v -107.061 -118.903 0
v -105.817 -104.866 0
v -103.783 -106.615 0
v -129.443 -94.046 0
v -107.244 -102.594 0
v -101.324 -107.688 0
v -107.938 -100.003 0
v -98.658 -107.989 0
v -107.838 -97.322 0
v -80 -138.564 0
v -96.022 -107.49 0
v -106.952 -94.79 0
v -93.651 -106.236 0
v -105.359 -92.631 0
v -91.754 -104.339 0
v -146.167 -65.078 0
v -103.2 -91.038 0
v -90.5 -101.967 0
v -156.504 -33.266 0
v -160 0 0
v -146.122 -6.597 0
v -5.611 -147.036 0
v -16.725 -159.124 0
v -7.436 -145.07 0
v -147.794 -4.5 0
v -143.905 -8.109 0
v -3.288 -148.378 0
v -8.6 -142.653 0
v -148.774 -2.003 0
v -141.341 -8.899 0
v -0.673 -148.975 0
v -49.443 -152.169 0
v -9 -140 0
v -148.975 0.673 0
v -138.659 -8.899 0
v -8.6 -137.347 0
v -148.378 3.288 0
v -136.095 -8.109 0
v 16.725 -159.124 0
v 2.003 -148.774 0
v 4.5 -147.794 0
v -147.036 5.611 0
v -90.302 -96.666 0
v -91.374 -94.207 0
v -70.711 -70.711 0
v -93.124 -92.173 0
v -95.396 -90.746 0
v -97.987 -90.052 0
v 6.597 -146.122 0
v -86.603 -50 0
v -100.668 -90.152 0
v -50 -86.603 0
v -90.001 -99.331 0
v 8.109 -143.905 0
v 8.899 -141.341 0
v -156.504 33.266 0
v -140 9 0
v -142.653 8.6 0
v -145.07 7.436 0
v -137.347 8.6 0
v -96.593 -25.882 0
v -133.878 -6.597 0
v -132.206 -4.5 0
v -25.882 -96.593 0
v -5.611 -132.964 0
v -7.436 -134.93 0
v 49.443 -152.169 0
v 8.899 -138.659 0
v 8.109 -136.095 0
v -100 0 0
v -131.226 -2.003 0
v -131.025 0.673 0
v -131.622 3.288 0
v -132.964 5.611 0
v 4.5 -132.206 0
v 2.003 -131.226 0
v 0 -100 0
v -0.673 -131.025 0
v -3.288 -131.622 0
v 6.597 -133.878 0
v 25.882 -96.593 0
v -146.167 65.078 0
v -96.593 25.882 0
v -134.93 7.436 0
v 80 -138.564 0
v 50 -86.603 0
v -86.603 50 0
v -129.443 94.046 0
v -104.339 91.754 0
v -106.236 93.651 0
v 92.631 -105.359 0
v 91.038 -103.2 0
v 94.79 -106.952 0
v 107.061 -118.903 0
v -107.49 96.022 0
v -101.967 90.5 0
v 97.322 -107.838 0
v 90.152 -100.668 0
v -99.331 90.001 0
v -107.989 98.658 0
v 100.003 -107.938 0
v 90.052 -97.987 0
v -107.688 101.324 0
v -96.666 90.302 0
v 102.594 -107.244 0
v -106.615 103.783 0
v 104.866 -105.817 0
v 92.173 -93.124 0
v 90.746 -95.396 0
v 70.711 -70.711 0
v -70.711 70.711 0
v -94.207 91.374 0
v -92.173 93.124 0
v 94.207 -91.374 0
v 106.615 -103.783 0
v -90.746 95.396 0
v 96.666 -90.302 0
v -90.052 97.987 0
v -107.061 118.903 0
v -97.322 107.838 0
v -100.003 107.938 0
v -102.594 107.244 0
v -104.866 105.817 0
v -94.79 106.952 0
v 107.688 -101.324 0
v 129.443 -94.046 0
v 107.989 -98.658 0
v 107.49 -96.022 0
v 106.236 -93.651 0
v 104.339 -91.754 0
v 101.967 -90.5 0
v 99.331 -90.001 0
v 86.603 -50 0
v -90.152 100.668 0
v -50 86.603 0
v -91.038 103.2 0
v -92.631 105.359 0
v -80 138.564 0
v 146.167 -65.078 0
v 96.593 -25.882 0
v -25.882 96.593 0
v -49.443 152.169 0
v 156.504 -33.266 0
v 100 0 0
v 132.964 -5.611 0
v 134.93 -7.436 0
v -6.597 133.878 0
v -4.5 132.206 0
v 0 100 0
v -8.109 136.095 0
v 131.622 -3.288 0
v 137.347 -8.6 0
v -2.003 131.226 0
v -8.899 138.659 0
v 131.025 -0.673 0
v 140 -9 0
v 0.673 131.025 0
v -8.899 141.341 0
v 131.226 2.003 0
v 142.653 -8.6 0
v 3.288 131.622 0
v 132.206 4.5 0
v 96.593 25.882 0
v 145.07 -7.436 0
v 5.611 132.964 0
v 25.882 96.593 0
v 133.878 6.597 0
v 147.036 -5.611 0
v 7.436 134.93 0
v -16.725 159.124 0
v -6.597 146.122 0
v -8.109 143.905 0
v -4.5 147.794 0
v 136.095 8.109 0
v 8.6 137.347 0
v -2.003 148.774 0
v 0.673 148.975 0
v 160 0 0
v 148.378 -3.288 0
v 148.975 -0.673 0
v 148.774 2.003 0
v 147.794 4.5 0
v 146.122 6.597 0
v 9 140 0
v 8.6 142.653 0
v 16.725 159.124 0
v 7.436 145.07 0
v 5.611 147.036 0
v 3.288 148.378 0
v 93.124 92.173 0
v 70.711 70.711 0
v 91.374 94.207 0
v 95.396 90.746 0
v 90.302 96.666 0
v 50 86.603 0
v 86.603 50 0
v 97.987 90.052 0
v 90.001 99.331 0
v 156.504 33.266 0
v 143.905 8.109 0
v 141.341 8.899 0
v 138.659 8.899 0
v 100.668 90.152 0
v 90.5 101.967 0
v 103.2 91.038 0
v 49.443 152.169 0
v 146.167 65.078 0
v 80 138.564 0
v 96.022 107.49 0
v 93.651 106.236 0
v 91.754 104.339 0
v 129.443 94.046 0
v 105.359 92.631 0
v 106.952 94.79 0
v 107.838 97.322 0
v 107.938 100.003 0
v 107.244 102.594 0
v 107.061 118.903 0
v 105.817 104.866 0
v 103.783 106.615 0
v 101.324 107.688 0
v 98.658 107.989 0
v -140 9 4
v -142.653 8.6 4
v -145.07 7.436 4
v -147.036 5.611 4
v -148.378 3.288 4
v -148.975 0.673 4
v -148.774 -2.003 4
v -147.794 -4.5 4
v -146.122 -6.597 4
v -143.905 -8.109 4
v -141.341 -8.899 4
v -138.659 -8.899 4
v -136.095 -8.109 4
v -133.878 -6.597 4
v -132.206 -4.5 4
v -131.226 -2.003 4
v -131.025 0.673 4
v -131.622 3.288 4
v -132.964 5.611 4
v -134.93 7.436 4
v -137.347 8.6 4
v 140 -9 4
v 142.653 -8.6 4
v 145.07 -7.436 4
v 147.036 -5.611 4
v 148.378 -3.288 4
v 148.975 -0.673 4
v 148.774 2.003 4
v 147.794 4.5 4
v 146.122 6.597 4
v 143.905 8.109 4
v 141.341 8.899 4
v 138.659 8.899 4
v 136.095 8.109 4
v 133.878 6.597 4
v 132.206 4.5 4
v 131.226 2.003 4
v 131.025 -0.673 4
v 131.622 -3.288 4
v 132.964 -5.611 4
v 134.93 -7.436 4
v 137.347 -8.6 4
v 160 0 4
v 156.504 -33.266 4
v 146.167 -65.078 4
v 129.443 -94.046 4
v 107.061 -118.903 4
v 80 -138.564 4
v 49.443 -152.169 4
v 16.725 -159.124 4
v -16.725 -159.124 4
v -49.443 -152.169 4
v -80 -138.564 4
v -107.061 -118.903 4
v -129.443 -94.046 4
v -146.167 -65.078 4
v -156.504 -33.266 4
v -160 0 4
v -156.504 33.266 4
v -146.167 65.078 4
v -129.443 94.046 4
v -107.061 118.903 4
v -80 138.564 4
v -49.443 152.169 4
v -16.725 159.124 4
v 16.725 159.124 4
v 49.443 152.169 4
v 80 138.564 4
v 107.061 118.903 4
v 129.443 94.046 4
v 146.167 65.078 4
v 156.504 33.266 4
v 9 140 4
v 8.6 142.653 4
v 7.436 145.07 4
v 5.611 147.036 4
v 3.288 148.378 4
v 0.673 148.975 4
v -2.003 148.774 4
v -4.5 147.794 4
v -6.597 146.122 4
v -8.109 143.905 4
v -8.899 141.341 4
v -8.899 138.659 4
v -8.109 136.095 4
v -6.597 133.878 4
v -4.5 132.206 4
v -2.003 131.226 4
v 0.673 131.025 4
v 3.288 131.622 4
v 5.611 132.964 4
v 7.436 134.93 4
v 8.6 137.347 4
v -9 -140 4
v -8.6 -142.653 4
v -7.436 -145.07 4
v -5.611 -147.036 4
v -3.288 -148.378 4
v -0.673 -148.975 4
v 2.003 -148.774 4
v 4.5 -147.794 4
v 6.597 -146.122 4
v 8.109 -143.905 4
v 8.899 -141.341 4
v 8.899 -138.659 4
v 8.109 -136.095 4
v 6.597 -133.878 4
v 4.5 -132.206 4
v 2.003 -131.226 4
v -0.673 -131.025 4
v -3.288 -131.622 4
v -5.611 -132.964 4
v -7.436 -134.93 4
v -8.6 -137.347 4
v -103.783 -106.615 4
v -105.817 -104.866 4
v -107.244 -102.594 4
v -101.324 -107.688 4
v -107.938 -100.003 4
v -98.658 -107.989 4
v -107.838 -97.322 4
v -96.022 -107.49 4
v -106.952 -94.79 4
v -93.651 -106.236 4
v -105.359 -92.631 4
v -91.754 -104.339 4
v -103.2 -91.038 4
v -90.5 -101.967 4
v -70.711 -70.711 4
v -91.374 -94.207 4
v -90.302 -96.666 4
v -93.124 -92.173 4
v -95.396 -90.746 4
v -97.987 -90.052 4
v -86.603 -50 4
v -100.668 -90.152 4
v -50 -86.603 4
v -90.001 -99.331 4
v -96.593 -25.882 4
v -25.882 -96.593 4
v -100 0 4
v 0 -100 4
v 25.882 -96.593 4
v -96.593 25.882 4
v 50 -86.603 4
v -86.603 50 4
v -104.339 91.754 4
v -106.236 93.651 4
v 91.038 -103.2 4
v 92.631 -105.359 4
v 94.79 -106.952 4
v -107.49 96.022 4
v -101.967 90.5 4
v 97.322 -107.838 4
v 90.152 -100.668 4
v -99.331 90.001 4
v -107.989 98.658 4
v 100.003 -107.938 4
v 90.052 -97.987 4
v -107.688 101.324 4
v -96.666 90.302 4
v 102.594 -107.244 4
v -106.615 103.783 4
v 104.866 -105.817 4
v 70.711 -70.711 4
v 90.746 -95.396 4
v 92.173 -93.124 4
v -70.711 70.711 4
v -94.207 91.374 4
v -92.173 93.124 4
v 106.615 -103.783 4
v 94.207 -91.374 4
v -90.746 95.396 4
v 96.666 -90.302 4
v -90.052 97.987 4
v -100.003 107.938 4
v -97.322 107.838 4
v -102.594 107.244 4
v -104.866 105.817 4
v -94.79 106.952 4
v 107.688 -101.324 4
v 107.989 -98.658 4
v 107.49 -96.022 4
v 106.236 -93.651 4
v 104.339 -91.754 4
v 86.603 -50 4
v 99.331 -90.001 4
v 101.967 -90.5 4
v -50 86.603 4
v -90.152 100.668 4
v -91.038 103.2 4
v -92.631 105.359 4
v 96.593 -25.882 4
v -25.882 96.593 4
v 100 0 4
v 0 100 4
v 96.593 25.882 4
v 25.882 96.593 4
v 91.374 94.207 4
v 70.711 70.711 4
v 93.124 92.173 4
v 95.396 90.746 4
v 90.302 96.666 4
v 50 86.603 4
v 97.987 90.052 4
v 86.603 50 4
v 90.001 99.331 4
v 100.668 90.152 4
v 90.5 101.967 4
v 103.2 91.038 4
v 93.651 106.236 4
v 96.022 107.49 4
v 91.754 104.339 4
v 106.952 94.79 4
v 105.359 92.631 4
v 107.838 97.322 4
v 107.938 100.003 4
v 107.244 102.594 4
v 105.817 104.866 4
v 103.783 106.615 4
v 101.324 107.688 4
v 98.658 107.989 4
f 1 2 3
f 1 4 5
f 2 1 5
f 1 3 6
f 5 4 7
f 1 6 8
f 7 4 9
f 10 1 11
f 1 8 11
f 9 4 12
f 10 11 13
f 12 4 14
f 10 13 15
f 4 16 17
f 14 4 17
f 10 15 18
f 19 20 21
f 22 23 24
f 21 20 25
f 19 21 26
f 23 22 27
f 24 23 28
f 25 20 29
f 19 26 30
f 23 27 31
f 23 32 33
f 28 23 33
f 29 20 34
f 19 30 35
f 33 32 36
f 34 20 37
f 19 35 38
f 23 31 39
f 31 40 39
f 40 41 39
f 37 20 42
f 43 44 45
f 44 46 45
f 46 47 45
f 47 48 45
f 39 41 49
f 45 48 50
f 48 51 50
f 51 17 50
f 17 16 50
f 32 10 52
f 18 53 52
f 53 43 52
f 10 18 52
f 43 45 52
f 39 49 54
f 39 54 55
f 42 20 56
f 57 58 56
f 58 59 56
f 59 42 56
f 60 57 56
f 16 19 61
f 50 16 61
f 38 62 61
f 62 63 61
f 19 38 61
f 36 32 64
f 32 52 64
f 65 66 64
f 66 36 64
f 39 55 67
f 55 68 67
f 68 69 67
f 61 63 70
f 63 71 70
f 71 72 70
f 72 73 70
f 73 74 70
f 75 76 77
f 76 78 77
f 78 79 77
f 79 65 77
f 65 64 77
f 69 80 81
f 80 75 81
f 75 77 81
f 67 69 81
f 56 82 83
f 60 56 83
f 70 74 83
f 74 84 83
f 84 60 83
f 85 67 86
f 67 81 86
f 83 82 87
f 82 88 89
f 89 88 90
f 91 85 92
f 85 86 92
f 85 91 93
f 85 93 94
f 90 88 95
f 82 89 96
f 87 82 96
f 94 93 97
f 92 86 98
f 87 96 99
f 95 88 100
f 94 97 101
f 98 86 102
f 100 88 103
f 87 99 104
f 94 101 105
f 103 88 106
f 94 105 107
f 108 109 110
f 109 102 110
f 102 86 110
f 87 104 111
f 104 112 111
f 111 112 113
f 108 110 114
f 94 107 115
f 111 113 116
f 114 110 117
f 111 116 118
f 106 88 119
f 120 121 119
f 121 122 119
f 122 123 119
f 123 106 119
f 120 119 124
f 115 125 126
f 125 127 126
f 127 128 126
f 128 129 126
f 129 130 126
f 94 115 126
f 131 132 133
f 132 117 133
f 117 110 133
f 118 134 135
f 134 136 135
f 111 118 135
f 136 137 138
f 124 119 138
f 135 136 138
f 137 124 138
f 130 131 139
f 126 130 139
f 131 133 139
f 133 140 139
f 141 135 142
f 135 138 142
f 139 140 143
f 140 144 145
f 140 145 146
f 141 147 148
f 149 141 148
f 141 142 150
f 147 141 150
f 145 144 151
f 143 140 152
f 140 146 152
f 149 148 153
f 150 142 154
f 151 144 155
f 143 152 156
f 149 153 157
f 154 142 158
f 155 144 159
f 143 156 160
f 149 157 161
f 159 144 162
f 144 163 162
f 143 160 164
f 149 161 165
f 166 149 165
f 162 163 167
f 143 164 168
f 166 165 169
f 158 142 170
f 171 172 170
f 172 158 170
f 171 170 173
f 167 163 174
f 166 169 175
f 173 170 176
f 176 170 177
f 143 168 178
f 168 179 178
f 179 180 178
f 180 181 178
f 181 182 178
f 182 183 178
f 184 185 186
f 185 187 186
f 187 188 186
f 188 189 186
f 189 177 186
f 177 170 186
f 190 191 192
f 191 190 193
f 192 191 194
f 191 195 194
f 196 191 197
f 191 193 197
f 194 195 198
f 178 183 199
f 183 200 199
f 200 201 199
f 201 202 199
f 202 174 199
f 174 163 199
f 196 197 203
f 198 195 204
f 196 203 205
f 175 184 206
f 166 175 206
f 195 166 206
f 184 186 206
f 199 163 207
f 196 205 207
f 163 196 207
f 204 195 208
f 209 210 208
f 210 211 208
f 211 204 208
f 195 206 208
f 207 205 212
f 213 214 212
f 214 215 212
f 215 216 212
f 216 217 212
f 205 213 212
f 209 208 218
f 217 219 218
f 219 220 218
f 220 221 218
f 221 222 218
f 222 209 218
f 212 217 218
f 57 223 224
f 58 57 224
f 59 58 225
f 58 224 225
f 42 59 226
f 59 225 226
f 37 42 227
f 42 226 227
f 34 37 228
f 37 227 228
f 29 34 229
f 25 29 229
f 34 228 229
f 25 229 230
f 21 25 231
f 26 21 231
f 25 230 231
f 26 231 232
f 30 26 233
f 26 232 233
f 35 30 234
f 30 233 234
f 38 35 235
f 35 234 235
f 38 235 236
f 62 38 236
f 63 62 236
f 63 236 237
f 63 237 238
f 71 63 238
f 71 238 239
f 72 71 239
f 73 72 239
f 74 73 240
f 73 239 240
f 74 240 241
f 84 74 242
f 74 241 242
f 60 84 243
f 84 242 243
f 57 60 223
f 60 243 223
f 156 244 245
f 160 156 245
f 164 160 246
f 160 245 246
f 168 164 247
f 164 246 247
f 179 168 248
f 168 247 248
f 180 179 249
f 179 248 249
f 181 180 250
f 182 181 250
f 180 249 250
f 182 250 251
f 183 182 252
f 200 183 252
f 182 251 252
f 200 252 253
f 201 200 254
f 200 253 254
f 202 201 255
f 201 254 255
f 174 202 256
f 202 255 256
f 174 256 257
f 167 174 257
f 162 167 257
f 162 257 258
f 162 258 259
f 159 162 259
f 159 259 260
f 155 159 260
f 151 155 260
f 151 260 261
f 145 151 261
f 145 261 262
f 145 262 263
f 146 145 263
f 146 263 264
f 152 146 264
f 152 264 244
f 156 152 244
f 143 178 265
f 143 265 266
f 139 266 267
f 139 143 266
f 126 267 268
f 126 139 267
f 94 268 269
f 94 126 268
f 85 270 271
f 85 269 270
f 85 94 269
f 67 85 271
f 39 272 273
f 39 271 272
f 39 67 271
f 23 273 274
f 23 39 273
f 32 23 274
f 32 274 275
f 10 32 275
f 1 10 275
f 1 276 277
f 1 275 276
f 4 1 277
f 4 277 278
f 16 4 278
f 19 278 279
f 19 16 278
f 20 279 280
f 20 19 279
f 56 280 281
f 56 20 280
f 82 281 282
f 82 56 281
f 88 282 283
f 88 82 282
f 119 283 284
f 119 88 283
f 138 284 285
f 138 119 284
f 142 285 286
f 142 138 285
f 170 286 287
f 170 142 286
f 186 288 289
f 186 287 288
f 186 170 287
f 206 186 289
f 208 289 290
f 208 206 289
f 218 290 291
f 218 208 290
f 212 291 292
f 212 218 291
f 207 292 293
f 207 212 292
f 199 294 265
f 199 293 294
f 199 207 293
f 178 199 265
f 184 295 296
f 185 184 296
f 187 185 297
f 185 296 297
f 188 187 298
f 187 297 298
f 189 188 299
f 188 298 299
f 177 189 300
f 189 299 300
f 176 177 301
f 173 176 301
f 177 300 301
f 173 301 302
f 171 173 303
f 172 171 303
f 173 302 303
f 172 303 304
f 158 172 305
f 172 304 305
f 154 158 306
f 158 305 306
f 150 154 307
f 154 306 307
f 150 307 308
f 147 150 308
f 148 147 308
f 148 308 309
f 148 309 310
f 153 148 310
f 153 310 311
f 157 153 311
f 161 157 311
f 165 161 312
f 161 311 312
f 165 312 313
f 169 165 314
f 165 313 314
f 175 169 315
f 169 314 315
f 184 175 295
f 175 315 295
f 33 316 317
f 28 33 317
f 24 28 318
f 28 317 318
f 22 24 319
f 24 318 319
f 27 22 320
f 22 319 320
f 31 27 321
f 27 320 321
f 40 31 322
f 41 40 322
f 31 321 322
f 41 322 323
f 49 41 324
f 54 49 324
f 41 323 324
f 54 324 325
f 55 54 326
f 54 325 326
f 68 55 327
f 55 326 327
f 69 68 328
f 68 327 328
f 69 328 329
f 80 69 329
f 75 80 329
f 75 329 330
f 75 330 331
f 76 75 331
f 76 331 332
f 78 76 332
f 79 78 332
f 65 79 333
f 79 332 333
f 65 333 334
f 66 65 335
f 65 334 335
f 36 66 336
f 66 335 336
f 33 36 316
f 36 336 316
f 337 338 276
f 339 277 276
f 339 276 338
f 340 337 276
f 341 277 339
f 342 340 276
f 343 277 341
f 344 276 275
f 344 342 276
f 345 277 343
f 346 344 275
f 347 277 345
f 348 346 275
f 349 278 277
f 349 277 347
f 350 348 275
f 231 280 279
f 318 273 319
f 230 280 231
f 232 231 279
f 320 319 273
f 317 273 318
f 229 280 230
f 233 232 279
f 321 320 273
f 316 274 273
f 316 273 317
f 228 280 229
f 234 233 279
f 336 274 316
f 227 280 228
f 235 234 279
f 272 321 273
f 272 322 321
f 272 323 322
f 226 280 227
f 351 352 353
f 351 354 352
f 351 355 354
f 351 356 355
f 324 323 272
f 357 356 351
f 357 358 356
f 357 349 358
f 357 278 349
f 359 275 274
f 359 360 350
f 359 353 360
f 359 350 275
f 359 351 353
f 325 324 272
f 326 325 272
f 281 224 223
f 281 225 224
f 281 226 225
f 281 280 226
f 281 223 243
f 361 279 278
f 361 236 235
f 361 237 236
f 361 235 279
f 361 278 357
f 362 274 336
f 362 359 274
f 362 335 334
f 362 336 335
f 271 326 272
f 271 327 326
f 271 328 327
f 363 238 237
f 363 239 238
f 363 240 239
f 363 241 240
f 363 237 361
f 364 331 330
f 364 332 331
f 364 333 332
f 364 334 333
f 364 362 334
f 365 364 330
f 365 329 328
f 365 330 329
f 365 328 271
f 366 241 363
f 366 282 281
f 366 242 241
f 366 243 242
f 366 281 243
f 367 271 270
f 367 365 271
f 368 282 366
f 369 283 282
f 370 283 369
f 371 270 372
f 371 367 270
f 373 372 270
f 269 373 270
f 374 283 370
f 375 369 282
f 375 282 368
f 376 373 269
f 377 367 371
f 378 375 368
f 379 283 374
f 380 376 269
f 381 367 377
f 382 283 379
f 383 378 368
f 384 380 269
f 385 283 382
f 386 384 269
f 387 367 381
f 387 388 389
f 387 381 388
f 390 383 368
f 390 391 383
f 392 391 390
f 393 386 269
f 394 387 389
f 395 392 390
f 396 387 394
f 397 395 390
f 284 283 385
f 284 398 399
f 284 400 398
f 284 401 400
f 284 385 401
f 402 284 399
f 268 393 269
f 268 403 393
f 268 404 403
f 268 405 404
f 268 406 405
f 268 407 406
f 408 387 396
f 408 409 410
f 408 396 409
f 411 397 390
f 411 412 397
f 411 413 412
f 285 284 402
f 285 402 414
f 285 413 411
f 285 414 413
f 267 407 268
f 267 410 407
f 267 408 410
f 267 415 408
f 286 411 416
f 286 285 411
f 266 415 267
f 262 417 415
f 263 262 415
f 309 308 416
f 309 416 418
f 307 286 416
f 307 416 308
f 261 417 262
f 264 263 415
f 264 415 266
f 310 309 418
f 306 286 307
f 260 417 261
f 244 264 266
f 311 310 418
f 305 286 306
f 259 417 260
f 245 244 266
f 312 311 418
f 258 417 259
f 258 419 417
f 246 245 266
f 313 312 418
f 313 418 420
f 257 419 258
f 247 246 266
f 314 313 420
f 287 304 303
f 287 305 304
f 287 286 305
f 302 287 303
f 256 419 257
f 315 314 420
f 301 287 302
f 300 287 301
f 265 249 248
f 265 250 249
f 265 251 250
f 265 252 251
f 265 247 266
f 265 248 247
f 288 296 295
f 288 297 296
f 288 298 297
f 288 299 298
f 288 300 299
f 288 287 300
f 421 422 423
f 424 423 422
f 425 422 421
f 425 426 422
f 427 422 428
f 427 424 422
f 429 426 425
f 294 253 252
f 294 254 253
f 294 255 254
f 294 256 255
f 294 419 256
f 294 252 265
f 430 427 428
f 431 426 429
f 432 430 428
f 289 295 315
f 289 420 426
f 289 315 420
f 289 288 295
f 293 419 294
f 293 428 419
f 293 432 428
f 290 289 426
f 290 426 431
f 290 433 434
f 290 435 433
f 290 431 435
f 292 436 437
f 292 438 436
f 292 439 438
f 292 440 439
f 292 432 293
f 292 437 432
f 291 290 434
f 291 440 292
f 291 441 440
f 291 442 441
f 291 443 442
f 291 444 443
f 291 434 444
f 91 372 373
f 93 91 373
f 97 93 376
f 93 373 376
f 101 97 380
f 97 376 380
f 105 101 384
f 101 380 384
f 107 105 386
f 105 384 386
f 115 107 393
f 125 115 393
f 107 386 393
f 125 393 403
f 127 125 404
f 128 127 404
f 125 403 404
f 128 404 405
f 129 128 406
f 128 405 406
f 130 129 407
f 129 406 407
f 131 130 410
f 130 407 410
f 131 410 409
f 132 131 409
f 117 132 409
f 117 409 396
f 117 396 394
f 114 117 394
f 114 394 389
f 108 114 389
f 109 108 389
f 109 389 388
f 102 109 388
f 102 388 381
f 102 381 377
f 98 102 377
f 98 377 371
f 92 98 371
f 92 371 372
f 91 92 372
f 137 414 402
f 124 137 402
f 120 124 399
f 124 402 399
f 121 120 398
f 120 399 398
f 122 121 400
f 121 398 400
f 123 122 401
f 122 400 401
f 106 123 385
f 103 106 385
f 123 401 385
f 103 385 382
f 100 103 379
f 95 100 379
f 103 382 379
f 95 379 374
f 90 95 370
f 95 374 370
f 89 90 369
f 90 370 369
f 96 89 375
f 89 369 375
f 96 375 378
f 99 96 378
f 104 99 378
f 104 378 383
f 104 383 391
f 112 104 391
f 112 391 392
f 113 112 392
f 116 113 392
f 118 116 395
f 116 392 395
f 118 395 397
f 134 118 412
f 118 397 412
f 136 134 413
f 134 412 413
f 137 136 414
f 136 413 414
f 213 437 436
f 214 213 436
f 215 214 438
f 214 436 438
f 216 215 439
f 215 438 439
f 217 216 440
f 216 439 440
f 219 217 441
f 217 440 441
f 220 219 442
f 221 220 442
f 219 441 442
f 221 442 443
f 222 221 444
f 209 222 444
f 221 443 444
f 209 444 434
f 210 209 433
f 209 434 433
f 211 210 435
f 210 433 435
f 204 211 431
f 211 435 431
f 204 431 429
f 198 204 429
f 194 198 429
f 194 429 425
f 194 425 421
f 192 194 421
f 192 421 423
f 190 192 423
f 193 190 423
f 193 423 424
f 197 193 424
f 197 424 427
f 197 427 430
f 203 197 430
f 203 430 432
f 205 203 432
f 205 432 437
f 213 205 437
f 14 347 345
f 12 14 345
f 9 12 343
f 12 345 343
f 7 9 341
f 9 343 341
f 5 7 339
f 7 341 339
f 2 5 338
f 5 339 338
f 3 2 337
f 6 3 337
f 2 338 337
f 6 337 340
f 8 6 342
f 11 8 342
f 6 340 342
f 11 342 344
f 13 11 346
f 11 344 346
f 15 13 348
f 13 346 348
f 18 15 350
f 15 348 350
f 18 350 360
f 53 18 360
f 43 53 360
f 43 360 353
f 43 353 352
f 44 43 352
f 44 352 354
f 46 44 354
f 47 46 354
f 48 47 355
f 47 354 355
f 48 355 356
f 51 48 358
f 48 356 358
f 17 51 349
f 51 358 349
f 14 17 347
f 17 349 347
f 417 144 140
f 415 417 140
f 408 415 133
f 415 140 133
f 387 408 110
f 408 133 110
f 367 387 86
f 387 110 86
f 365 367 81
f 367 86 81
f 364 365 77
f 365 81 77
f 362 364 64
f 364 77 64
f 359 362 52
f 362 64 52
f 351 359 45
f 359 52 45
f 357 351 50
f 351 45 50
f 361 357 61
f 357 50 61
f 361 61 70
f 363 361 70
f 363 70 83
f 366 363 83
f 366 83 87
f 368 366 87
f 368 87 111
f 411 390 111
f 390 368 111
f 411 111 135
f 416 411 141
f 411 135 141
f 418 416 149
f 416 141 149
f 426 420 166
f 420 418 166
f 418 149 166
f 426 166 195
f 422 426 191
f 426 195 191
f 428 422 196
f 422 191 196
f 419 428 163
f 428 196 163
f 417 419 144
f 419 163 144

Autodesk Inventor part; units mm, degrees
ref_plane "YZ Plane" through (0, 0, 0) normal (1, 0, 0) x (0, 1, 0)
ref_plane "XZ Plane" through (0, 0, 0) normal (0, 1, 0) x (-1, 0, 0)
ref_plane "XY Plane" through (0, 0, 0) normal (0, 0, 1) x (1, 0, 0)
sketch "Sketch1" plane through (0, 0, 0) normal (0, 0, 1) x (1, 0, 0)
  circle A0 centre (0, 0) radius 100
  circle A1 centre (0, 0) radius 160
  dimension "d22" = 200
  dimension "d23" = 320
extrude "Plate1" add sketch "Sketch1" along normal blind 4
sketch "Sketch5" plane through (0, 0, 4) normal (0, 0, 1) x (1, 0, 0)
  circle A0 centre (0, 0) radius 140 construction
  circle A1 centre (0, 140) radius 9
  dimension "d32" = 280
  dimension "d31" = 18
extrude "Cut1" cut sketch "Sketch5" against normal blind 4
pattern_circular "Circular Pattern1" count 8 over 360 about axis through (0, 0, 0) along (0, 0, 1) of "Cut1"
equation "\"d26\" = Thickness"
equation "\"d2\" = Thickness"
equation "\"BendReliefWidth\" = Thickness"
equation "\"BendReliefDepth\" = 0.5 * Thickness"
equation "\"CornerReliefSize\" = 4 * Thickness"
equation "\"MinimumRemnant\" = 2 * Thickness"
equation "\"TransitionRadius\" = BendRadius"
equation "\"JacobiRadiusSize\" = BendRadius"
equation "\"GapSize\" = Thickness"
equation "\"Thickness\" = 4"
equation "\"BendRadius\" = 5"
properties part number "TKS 3108 top DS double flange" material "Stainless Steel"
